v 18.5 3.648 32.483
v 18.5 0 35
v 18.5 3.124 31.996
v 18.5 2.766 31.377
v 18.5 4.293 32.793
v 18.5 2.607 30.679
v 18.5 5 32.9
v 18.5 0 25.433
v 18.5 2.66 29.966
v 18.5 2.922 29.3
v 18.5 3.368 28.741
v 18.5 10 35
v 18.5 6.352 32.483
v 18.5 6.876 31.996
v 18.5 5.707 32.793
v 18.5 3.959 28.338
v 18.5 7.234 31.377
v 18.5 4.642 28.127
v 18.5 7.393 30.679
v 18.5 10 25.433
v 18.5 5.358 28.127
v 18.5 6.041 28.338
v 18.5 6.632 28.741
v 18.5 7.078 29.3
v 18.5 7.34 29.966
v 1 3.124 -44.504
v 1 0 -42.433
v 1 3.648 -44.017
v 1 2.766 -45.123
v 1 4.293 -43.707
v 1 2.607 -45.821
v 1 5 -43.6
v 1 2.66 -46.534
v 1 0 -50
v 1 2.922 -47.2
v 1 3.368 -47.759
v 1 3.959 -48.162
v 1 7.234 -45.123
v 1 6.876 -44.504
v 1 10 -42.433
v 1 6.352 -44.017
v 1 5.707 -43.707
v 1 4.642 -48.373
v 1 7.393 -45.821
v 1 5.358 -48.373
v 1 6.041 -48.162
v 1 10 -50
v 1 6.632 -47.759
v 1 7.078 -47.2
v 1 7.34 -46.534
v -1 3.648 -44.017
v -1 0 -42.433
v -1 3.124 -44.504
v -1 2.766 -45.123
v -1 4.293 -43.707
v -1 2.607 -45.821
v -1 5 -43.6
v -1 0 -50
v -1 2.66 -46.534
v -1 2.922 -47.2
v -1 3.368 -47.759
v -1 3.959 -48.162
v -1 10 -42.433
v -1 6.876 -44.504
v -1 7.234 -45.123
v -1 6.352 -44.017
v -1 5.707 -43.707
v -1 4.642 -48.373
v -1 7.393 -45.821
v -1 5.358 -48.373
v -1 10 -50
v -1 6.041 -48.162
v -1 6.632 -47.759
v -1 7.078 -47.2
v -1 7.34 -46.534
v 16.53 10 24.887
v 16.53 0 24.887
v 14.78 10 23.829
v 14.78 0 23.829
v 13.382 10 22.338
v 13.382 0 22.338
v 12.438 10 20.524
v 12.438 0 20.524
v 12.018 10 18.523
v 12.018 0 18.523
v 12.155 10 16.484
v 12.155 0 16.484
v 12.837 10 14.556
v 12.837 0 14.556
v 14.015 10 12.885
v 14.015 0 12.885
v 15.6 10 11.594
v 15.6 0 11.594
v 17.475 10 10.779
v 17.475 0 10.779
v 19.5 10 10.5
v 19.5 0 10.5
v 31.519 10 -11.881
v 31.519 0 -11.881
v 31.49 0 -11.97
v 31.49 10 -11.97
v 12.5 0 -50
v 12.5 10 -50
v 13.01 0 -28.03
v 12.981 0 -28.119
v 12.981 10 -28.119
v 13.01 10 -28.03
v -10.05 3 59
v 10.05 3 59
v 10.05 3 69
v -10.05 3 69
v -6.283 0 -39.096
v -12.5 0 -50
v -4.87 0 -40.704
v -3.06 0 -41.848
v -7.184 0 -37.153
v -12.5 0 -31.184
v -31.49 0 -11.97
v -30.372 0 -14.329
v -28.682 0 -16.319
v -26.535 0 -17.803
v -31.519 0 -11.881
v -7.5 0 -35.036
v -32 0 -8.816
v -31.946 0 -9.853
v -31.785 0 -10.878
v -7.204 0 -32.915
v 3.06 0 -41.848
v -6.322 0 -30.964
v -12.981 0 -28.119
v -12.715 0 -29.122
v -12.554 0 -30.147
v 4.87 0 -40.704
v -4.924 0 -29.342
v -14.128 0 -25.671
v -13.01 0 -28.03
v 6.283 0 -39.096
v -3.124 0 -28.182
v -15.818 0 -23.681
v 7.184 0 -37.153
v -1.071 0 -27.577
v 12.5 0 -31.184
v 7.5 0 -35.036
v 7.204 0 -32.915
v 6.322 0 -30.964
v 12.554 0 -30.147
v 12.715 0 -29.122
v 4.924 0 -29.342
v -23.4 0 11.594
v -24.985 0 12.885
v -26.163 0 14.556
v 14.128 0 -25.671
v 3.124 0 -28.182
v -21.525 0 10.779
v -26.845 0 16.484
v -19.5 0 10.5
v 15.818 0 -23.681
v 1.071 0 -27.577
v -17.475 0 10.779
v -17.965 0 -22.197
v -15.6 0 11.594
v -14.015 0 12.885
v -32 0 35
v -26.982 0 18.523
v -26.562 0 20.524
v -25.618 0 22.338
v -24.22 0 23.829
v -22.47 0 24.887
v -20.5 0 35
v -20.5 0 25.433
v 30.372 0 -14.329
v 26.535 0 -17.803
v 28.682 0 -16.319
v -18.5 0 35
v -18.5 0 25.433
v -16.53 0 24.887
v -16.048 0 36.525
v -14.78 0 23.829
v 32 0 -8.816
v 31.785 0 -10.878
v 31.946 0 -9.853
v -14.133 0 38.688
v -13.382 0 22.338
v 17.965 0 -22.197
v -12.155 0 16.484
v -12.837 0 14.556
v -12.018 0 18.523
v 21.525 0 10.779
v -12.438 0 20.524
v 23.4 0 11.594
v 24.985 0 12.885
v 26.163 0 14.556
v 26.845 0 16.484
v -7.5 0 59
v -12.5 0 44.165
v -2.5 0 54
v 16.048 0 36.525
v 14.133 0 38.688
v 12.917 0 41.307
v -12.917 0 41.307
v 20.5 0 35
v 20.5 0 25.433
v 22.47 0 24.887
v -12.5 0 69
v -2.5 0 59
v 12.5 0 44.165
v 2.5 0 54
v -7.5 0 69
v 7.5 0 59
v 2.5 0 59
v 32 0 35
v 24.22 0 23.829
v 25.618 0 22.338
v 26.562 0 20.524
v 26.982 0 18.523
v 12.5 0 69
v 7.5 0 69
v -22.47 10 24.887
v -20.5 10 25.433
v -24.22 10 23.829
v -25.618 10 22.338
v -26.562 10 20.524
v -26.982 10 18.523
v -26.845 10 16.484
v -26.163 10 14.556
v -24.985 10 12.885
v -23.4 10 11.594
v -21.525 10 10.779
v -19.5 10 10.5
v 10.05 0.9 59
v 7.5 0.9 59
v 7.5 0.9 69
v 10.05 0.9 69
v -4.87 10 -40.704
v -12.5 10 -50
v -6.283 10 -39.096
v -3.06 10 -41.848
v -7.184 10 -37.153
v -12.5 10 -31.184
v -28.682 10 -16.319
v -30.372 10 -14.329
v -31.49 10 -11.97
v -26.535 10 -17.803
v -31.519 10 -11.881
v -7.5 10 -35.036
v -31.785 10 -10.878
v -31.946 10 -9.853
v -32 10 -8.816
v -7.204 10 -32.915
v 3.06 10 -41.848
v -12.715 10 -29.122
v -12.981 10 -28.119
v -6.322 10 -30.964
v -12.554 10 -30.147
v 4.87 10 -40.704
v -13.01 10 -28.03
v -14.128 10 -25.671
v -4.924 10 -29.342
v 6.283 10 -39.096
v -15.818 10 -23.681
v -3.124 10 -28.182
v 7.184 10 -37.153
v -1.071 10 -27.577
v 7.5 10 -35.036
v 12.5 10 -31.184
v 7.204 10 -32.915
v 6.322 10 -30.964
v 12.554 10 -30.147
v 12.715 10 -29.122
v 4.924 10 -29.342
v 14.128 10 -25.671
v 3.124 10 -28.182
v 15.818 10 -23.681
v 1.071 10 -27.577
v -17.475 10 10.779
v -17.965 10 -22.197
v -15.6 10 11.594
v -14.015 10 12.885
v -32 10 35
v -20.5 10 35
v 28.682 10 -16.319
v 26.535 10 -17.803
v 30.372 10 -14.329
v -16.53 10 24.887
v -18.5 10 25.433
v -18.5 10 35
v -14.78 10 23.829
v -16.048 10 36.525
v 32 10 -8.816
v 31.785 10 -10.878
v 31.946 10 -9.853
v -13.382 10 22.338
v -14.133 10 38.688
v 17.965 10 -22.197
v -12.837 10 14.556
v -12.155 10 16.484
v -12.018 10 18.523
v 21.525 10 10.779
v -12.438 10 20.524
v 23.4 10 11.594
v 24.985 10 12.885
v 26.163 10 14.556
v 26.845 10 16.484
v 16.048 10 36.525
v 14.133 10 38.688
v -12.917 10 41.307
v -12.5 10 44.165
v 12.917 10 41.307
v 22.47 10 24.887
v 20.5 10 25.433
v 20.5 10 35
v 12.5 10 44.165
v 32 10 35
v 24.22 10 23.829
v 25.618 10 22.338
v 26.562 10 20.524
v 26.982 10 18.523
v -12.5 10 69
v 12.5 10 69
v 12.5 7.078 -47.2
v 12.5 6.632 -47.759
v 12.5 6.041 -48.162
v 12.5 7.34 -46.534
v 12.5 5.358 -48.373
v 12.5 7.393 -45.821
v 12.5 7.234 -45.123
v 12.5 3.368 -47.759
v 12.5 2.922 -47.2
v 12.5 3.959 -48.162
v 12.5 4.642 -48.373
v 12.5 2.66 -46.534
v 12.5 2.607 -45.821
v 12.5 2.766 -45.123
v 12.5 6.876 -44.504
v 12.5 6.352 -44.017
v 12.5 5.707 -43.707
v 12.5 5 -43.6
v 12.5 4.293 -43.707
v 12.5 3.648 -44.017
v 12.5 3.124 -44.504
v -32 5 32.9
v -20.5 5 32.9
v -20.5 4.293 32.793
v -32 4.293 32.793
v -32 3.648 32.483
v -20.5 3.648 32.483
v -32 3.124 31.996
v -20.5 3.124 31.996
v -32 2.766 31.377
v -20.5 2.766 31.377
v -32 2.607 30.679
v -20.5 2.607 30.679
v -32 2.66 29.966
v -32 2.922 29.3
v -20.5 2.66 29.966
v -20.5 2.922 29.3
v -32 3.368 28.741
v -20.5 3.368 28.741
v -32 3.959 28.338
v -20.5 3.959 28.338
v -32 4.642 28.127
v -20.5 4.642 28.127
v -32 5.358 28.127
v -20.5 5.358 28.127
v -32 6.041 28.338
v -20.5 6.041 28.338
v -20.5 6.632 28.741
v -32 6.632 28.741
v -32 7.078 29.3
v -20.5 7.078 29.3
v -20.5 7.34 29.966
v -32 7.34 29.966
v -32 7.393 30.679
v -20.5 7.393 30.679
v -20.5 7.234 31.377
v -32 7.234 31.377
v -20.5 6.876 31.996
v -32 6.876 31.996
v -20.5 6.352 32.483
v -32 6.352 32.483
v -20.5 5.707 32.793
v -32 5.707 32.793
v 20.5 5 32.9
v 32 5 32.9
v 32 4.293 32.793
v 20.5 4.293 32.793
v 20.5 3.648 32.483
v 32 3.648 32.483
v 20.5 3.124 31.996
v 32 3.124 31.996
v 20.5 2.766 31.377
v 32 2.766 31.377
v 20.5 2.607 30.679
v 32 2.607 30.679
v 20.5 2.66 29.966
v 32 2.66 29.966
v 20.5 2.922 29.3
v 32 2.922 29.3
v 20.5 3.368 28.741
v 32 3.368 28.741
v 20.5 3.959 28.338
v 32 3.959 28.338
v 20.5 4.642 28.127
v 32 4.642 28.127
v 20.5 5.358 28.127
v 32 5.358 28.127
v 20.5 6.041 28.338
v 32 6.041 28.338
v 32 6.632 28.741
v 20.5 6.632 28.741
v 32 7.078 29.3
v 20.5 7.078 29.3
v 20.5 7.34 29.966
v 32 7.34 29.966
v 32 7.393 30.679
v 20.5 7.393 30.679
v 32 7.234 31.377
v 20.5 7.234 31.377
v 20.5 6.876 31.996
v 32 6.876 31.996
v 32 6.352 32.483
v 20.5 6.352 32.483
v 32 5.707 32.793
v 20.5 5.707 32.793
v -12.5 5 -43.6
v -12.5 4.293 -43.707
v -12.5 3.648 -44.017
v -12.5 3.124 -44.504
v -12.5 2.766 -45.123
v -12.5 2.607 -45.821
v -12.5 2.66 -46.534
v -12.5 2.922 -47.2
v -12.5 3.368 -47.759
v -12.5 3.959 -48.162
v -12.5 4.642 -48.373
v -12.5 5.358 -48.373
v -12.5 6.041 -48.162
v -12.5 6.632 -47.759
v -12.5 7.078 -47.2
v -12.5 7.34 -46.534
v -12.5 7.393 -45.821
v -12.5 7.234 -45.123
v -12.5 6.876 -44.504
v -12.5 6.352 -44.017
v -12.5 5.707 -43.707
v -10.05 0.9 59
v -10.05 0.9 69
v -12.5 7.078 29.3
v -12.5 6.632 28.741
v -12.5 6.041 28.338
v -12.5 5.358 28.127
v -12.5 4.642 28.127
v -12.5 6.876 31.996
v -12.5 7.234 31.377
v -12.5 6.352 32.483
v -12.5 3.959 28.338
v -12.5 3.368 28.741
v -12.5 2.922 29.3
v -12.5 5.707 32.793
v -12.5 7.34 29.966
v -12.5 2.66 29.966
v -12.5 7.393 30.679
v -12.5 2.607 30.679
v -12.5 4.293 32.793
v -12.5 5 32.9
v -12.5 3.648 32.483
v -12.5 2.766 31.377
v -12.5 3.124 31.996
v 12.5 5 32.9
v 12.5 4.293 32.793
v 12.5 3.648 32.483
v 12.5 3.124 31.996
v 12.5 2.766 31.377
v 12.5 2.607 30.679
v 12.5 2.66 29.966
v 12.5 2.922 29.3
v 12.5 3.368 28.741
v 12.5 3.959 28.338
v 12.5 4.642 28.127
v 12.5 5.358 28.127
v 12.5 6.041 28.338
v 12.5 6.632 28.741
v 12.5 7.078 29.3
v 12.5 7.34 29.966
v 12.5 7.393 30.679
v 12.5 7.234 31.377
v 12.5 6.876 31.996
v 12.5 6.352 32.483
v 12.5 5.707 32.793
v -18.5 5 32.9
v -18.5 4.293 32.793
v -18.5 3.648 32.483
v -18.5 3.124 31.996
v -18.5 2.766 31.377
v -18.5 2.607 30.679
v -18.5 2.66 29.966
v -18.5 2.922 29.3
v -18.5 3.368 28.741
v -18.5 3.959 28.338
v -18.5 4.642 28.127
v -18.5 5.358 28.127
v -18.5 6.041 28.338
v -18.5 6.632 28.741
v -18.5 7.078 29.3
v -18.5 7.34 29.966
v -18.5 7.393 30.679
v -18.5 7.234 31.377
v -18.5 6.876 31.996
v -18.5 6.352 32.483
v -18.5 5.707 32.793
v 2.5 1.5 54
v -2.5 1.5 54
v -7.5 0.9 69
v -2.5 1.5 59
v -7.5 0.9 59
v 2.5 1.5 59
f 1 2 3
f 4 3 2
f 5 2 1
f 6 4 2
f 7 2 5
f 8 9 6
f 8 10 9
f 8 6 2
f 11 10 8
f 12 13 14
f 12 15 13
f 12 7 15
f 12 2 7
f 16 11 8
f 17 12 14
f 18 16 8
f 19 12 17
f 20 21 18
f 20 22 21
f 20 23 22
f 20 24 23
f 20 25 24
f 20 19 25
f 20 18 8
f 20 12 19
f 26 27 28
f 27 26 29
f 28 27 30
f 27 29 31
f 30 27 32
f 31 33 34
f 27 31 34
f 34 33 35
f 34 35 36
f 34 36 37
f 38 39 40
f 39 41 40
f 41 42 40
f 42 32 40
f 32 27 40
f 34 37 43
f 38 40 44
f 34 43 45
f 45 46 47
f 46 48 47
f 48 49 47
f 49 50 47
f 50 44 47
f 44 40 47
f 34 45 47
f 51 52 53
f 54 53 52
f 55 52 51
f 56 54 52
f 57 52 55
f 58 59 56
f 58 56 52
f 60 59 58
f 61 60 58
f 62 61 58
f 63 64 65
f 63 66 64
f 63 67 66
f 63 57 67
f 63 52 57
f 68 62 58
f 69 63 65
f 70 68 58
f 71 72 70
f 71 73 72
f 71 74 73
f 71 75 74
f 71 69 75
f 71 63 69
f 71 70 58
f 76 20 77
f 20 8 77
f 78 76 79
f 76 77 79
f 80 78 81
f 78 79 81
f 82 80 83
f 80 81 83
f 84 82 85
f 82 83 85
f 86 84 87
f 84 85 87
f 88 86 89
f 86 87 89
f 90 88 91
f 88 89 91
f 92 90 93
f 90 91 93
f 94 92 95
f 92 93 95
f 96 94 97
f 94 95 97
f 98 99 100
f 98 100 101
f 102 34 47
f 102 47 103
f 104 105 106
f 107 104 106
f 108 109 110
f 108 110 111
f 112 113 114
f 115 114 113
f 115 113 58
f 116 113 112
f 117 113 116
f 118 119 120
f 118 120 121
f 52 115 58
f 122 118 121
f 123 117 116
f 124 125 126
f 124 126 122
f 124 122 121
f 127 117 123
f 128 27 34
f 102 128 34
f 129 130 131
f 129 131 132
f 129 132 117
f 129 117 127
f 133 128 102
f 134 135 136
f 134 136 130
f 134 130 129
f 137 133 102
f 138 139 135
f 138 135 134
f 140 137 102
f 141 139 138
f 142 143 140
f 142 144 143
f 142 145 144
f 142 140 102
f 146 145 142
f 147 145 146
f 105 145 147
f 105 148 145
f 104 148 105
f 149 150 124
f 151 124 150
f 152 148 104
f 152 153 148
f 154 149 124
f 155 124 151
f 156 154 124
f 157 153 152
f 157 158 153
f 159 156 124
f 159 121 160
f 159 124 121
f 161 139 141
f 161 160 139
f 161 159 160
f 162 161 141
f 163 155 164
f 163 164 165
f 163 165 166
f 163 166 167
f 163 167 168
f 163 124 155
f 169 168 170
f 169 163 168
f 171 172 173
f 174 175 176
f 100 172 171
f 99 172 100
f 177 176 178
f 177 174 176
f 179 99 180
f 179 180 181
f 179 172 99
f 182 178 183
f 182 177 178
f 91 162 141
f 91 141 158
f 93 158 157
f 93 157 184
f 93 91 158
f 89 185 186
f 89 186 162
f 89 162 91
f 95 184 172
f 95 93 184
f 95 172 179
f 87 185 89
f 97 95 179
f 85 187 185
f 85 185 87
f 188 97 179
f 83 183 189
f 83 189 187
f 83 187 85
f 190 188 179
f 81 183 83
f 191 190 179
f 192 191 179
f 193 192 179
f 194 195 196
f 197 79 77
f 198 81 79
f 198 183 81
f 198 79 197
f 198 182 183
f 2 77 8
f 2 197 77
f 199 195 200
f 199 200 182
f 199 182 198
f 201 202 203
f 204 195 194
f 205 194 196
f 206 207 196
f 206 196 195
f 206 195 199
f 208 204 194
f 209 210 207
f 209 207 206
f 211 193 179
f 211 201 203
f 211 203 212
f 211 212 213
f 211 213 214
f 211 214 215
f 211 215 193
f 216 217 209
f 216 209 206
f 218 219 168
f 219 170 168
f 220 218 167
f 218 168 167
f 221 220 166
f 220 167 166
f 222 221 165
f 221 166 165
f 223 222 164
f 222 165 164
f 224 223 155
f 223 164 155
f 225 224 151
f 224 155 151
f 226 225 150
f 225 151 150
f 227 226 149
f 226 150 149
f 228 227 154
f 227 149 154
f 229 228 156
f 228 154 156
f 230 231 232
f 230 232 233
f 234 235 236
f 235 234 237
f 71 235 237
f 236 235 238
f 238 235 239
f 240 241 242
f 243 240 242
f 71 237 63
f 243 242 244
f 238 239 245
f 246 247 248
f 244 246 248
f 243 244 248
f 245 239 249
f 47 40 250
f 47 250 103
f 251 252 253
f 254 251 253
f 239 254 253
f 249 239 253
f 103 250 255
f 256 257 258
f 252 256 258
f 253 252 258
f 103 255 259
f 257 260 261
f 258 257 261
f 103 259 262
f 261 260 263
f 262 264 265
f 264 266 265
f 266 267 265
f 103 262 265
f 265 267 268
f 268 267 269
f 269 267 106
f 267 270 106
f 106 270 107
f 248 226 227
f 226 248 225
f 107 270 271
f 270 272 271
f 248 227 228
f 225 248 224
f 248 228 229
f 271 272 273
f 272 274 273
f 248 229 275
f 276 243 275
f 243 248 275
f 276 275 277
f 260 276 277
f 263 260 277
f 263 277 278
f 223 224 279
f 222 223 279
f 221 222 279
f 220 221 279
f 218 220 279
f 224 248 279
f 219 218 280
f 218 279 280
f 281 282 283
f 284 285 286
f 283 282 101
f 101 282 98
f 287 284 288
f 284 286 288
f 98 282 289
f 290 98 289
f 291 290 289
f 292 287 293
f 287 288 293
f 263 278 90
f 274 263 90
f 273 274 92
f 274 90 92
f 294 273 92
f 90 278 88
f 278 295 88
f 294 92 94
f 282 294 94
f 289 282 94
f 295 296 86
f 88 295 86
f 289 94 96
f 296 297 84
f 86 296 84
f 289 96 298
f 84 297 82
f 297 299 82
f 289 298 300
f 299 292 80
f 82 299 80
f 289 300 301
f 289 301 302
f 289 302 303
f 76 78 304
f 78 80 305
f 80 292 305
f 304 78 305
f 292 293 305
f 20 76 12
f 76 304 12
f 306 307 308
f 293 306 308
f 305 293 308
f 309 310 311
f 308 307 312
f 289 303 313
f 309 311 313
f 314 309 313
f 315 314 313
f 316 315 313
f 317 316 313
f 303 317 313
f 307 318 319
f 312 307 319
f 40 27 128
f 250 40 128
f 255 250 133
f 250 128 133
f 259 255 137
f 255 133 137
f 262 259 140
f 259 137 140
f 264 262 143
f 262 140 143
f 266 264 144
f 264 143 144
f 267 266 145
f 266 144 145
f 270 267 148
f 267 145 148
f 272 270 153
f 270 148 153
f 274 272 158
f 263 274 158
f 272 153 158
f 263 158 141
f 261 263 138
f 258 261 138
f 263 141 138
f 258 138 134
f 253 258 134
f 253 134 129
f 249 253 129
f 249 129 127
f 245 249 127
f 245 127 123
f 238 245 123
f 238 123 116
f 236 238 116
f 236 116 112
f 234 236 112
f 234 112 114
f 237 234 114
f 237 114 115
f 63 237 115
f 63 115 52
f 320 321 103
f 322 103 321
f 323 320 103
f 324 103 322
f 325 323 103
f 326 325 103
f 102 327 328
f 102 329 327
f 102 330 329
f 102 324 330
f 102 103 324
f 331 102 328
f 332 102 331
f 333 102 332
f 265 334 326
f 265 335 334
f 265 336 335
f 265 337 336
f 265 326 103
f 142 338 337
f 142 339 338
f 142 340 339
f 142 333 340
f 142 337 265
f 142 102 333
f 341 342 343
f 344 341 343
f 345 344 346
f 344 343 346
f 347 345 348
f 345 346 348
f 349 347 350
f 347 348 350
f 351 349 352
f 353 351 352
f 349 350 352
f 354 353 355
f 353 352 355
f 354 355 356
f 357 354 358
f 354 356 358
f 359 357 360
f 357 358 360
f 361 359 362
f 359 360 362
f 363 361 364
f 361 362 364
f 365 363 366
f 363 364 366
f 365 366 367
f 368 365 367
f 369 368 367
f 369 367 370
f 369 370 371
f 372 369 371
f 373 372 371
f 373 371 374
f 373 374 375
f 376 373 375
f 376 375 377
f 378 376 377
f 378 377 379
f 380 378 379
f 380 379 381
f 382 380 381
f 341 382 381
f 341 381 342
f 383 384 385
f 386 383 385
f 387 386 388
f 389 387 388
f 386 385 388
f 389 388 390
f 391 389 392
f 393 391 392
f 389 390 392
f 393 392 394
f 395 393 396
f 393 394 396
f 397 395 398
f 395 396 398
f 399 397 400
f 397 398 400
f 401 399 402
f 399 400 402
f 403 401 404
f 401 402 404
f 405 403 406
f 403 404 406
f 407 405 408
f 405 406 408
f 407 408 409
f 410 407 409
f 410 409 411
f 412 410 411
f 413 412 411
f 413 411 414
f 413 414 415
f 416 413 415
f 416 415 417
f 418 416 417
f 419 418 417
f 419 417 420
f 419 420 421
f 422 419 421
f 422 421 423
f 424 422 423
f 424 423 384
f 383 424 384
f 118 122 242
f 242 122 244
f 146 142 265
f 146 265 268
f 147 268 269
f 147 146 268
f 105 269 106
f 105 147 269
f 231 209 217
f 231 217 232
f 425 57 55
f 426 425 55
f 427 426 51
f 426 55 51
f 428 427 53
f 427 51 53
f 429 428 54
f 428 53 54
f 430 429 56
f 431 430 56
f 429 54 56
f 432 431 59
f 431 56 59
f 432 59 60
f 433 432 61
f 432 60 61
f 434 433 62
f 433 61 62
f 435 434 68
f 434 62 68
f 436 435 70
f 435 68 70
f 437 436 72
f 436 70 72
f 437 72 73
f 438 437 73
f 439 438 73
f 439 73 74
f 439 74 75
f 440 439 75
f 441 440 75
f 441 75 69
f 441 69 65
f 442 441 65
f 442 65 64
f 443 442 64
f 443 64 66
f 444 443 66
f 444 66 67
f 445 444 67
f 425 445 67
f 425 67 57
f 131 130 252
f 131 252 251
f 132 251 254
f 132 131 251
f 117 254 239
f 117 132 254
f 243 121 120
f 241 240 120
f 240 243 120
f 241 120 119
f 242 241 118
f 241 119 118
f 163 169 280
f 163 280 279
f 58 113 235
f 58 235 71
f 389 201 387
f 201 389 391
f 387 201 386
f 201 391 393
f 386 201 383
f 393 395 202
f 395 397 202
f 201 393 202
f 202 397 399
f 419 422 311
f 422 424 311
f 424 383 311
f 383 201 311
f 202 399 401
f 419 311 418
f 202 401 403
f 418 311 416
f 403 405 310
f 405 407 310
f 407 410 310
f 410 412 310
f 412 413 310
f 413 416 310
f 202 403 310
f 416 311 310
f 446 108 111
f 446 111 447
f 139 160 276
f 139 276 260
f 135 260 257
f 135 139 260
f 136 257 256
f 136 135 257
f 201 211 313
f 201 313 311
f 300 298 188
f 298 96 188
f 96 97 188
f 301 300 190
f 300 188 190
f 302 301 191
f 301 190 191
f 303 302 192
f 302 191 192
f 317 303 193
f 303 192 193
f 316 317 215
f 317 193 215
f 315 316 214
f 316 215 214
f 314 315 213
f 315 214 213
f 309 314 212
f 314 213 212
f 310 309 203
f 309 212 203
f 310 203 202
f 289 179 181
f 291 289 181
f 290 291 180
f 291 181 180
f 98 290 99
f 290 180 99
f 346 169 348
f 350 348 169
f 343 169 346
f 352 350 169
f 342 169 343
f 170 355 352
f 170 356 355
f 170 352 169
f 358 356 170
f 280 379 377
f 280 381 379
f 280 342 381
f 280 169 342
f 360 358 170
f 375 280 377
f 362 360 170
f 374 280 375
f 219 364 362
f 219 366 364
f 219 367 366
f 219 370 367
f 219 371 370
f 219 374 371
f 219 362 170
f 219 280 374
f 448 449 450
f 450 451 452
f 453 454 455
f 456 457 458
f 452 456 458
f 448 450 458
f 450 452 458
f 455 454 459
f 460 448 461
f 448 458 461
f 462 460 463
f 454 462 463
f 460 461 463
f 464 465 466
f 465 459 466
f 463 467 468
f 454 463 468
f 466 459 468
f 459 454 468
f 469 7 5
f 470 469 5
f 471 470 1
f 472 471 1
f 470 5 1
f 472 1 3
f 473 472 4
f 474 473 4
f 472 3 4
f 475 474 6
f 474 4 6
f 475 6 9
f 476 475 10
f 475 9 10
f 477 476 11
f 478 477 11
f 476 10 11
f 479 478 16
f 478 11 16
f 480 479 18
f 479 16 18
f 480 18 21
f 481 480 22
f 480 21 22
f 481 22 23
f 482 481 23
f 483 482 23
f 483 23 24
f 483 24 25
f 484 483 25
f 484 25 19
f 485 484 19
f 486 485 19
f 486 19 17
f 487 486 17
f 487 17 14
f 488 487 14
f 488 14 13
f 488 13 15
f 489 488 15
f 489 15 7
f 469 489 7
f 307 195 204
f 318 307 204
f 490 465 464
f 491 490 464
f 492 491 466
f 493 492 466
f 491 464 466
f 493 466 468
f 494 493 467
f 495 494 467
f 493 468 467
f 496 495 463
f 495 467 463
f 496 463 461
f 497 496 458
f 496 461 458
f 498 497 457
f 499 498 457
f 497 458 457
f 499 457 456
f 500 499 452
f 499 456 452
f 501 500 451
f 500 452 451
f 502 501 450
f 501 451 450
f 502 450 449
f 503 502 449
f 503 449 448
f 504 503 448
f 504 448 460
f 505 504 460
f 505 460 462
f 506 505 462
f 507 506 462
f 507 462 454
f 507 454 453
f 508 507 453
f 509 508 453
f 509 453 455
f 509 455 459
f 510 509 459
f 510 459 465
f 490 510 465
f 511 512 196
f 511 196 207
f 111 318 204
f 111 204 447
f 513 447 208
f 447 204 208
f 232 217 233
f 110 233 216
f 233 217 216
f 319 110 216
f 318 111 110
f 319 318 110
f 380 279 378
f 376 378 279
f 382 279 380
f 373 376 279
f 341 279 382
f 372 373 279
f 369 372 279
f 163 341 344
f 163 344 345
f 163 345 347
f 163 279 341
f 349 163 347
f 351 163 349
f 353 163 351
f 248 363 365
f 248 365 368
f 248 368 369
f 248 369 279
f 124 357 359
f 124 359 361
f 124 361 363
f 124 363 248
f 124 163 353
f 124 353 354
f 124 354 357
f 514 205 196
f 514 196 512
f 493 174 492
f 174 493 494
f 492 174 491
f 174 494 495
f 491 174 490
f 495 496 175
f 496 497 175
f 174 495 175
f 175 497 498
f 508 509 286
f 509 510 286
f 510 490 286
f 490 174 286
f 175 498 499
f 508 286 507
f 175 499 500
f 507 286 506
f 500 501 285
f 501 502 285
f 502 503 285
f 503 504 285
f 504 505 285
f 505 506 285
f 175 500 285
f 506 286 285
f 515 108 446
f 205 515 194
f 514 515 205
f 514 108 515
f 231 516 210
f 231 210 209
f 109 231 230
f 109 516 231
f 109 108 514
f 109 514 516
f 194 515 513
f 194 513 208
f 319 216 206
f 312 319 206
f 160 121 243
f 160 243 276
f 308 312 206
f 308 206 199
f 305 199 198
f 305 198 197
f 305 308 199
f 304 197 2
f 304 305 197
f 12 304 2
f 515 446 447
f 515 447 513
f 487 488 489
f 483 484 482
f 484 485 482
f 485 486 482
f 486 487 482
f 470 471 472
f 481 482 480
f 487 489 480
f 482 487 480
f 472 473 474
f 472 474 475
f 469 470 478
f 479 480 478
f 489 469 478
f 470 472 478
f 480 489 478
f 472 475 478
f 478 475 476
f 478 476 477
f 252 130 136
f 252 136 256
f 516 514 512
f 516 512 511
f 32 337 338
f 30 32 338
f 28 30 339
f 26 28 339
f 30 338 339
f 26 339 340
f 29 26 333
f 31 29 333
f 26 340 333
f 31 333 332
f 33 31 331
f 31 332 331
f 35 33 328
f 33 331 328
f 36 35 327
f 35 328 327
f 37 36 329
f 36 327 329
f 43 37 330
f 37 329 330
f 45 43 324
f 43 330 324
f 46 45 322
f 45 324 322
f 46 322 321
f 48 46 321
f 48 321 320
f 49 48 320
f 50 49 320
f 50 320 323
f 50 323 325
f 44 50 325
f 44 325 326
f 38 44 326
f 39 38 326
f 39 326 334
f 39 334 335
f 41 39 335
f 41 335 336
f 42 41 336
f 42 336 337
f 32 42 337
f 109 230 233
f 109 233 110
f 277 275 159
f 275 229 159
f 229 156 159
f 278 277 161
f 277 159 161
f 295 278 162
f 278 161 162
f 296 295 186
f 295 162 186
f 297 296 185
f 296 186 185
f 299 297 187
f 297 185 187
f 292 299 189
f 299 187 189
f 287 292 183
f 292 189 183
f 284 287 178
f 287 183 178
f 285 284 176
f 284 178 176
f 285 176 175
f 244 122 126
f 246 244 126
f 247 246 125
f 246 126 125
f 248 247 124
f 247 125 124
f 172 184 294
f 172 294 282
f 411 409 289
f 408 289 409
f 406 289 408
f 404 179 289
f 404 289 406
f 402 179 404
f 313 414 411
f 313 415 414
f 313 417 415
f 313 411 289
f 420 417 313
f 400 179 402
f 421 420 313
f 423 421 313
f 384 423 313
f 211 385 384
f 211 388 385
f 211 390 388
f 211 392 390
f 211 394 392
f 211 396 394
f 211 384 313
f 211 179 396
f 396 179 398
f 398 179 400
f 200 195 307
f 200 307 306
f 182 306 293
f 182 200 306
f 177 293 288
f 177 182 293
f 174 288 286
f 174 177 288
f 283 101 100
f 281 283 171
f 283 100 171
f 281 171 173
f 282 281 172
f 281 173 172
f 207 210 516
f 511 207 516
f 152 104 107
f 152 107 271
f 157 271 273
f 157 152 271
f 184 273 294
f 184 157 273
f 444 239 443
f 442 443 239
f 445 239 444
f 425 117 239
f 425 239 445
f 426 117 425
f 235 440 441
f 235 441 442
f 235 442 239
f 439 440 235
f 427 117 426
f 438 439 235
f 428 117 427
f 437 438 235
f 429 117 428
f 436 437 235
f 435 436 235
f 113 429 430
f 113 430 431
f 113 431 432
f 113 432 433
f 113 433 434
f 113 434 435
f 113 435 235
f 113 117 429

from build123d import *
from OCP.BRepFilletAPI import BRepFilletAPI_MakeChamfer

# Parameters (mm, degrees)
SKETCH1_W               = 24
SKETCH1_H               = 40
BOSS_EXTRUDE1_DEPTH     = 10
SKETCH2_R               = 7.5
BOSS_EXTRUDE2_DEPTH     = 10
SKETCH4_W               = 2
SKETCH4_H               = 20
SKETCH4_H_2             = 16
CUT_EXTRUDE1_DEPTH      = 20
SKETCH5_R               = 2.4
CUT_EXTRUDE2_DEPTH      = 74
CHAMFER3_SIZE           = 2
CHAMFER3_SIZE2          = 4.613601474
BOSS_EXTRUDE3_DEPTH     = 10
CUT_EXTRUDE3_DEPTH      = 10
CUT_EXTRUDE3_DEPTH_BACK = 10
FILLET1_R               = 10
SKETCH8_W               = 5
SKETCH8_H               = 3
CUT_EXTRUDE4_DEPTH      = 5


with BuildPart() as part:
    # Sketch1 → Boss-Extrude1 (new body)
    with BuildSketch(Plane(origin=(0, 0, 0), x_dir=(1, 0, 0), z_dir=(0, 1, 0))):
        Rectangle(SKETCH1_W, SKETCH1_H)
    extrude(amount=BOSS_EXTRUDE1_DEPTH)

    # Sketch2 → Boss-Extrude2 (add)
    with BuildSketch(Plane.XZ):
        Polygon((7, -20), (-7, -20), (-7, 35), (-32, 35), (-32, -15), (-12.5, -25), (-12.5, -50), (12.5, -50), (12.5, -25), (32, -15), (32, 35), (7, 35), align=None)
        with Locations(Location((0, -35, 0), (0, 0, 270))):
            Circle(SKETCH2_R, mode=Mode.SUBTRACT)
        with Locations(Location((-19.5, 18, 0), (0, 0, 270))):
            Circle(SKETCH2_R, mode=Mode.SUBTRACT)
        with Locations(Location((19.5, 18, 0), (0, 0, 270))):
            Circle(SKETCH2_R, mode=Mode.SUBTRACT)
    extrude(amount=-BOSS_EXTRUDE2_DEPTH)

    # Sketch4 → Cut-Extrude1 (cut)
    with BuildSketch(Plane(origin=(0, 10, 0), x_dir=(1, 0, 0), z_dir=(0, 1, 0))):
        with Locations((19.5, -35)):
            Rectangle(SKETCH4_W, SKETCH4_H)
        with Locations((-19.5, -35)):
            Rectangle(SKETCH4_W, SKETCH4_H)
        with Locations((0, 50)):
            Rectangle(SKETCH4_W, SKETCH4_H_2)
    extrude(amount=-CUT_EXTRUDE1_DEPTH, mode=Mode.SUBTRACT)

    # Sketch5 → Cut-Extrude2 (cut)
    with BuildSketch(Plane(origin=(32, 0, 0), x_dir=(0, 0, -1), z_dir=(1, 0, 0))):
        with Locations(Location((-30.5, 5, 0), (0, 0, 180))):
            Circle(SKETCH5_R)
        with Locations(Location((46, 5, 0), (0, 0, 180))):
            Circle(SKETCH5_R)
    extrude(amount=-CUT_EXTRUDE2_DEPTH, mode=Mode.SUBTRACT)

    # Chamfer3: one chamfer whose edges measure the first distance from different faces: ONE call of the kernel's chamfer builder (chamfer() names one face for all edges)
    chamfer3_edges_1 = [part.edges().sort_by_distance(p)[0] for p in [
        (-12.5, 5, -25),
        (-32, 5, -15),
    ]]
    chamfer3_side_1 = [part.faces().sort_by_distance(p)[0] for p in [
        (-22.25, 5, -20),
    ]]
    chamfer3_edges_2 = [part.edges().sort_by_distance(p)[0] for p in [
        (32, 5, -15),
        (12.5, 5, -25),
    ]]
    chamfer3_side_2 = [part.faces().sort_by_distance(p)[0] for p in [
        (22.25, 5, -20),
    ]]
    chamfer3 = BRepFilletAPI_MakeChamfer(part.part.solid().wrapped)
    for e in chamfer3_edges_1:
        chamfer3.Add(CHAMFER3_SIZE, CHAMFER3_SIZE2, e.wrapped, chamfer3_side_1[0].wrapped)  # the first distance lies on this face
    for e in chamfer3_edges_2:
        chamfer3.Add(CHAMFER3_SIZE, CHAMFER3_SIZE2, e.wrapped, chamfer3_side_2[0].wrapped)  # the first distance lies on this face
    add(Compound.cast(chamfer3.Shape()), mode=Mode.REPLACE)

    # Sketch6 → Boss-Extrude3 (add)
    with BuildSketch(Plane.XZ):
        Polygon((-12.5, 22.639119403), (-12.5, 69), (12.5, 69), (12.5, 22.639119403), (7, 20), (-7, 20), align=None)
    extrude(amount=-BOSS_EXTRUDE3_DEPTH)

    # Sketch7 → Cut-Extrude3 (cut, two sides: drawn at the far end of the back side and taken through both)
    with BuildSketch(Plane.XY.offset(69).offset(-CUT_EXTRUDE3_DEPTH_BACK)):
        Polygon((-10.05, 0.9), (-7.5, 0.9), (-7.5, -1.2), (7.5, -1.2), (7.5, 0.9), (10.05, 0.9), (10.05, 3), (-10.05, 3), align=None)
    extrude(amount=CUT_EXTRUDE3_DEPTH + CUT_EXTRUDE3_DEPTH_BACK, mode=Mode.SUBTRACT)

    # Fillet1
    # the kernel refuses this fillet: 10 mm, written as the material it adds along each edge
    with BuildSketch(Plane(origin=(12.5, 0, -29.613601474), x_dir=(0.3065313660894553, 0, 0.9518605578567336), z_dir=(0, 1, 0)), Plane(origin=(-12.5, 0, -29.613601474), x_dir=(0, 0, -1), z_dir=(0, 1, 0))) as fillet1_piece_1:
        with BuildLine():
            CenterArc((FILLET1_R * 0.15704572996, FILLET1_R), FILLET1_R, 252.149681698, 17.850318302)
            Line((-FILLET1_R * 0.149485636129, FILLET1_R * 0.0481394421433), (0, 0))
            Line((0, 0), (FILLET1_R * 0.15704572996, 0))
        make_face()
    extrude(amount=10)
    with BuildSketch(Plane(origin=(14.279634926, 0, -24.087366705), x_dir=(0.8898174628127374, 0, 0.4563166475962744), z_dir=(0, 1, 0)), Plane(origin=(-14.279634926, 0, -24.087366705), x_dir=(0.30653136608945597, 0, -0.9518605578567335), z_dir=(0, 1, 0))) as fillet1_piece_2:
        with BuildLine():
            CenterArc((FILLET1_R * 0.414213562373, FILLET1_R), FILLET1_R, 225, 45)
            Line((-FILLET1_R * 0.292893218813, FILLET1_R * 0.292893218813), (0, 0))
            Line((0, 0), (FILLET1_R * 0.414213562373, 0))
        make_face()
    extrude(amount=10)
    with BuildSketch(Plane(origin=(12.5, 10, 35), x_dir=(0, 0, 1), z_dir=(0, -1, 0))) as fillet1_piece_3:
        with BuildLine():
            CenterArc((9.16515139, -10), FILLET1_R, 90, 66.421821522)
            Line((0, -6), (0, 0))
            Line((0, 0), (9.16515139, 0))
        make_face()
    extrude(amount=10)
    with BuildSketch(Plane(origin=(-12.5, 0, 35), x_dir=(-1, 0, 0), z_dir=(0, 1, 0))) as fillet1_piece_4:
        with BuildLine():
            CenterArc((10, 9.16515139), FILLET1_R, 180, 66.421821522)
            Line((0, 9.16515139), (0, 0))
            Line((0, 0), (6, 0))
        make_face()
    extrude(amount=10)
    # the kernel refuses this fillet: 10 mm, written as the material it takes off along each edge
    with BuildSketch(Plane(origin=(30.220365074, -10.355339059, -15.912633295), x_dir=(-0.8898174628127375, 0, -0.45631664759627466), z_dir=(0, 1, 0))) as fillet1_2_piece_1:
        with BuildLine():
            CenterArc((FILLET1_R * 0.414213562373, FILLET1_R), FILLET1_R, 225, 45)
            Line((-FILLET1_R * 0.292893218813, FILLET1_R * 0.292893218813), (0, 0))
            Line((0, 0), (FILLET1_R * 0.414213562373, 0))
        make_face()
    extrude(amount=30.710678119, mode=Mode.SUBTRACT)
    with BuildSketch(Plane(origin=(32, -3.926143249, -10.386398526), x_dir=(0, 0, 1), z_dir=(0, 1, 0)), Plane(origin=(-32, -3.926143249, -10.386398526), x_dir=(0.3065313660894543, 0, -0.9518605578567341), z_dir=(0, 1, 0))) as fillet1_2_piece_2:
        with BuildLine():
            CenterArc((FILLET1_R * 0.15704572996, -FILLET1_R), FILLET1_R, 90, 17.850318302)
            Line((-FILLET1_R * 0.149485636129, -FILLET1_R * 0.0481394421433), (0, 0))
            Line((0, 0), (FILLET1_R * 0.15704572996, 0))
        make_face()
    extrude(amount=17.852286498, mode=Mode.SUBTRACT)
    with BuildSketch(Plane(origin=(-30.220365074, -10.355339059, -15.912633295), x_dir=(0.889817462812737, 0, -0.45631664759627527), z_dir=(0, 1, 0))) as fillet1_2_piece_3:
        with BuildLine():
            CenterArc((FILLET1_R * 0.414213562373, -FILLET1_R), FILLET1_R, 90, 45)
            Line((-FILLET1_R * 0.292893218813, -FILLET1_R * 0.292893218813), (0, 0))
            Line((0, 0), (FILLET1_R * 0.414213562373, 0))
        make_face()
    extrude(amount=30.710678119, mode=Mode.SUBTRACT)

    # Sketch8 → Cut-Extrude4 (cut)
    with BuildSketch(Plane.XY.offset(59)):
        Rectangle(SKETCH8_W, SKETCH8_H)
    extrude(amount=-CUT_EXTRUDE4_DEPTH, mode=Mode.SUBTRACT)


solid = part.part
